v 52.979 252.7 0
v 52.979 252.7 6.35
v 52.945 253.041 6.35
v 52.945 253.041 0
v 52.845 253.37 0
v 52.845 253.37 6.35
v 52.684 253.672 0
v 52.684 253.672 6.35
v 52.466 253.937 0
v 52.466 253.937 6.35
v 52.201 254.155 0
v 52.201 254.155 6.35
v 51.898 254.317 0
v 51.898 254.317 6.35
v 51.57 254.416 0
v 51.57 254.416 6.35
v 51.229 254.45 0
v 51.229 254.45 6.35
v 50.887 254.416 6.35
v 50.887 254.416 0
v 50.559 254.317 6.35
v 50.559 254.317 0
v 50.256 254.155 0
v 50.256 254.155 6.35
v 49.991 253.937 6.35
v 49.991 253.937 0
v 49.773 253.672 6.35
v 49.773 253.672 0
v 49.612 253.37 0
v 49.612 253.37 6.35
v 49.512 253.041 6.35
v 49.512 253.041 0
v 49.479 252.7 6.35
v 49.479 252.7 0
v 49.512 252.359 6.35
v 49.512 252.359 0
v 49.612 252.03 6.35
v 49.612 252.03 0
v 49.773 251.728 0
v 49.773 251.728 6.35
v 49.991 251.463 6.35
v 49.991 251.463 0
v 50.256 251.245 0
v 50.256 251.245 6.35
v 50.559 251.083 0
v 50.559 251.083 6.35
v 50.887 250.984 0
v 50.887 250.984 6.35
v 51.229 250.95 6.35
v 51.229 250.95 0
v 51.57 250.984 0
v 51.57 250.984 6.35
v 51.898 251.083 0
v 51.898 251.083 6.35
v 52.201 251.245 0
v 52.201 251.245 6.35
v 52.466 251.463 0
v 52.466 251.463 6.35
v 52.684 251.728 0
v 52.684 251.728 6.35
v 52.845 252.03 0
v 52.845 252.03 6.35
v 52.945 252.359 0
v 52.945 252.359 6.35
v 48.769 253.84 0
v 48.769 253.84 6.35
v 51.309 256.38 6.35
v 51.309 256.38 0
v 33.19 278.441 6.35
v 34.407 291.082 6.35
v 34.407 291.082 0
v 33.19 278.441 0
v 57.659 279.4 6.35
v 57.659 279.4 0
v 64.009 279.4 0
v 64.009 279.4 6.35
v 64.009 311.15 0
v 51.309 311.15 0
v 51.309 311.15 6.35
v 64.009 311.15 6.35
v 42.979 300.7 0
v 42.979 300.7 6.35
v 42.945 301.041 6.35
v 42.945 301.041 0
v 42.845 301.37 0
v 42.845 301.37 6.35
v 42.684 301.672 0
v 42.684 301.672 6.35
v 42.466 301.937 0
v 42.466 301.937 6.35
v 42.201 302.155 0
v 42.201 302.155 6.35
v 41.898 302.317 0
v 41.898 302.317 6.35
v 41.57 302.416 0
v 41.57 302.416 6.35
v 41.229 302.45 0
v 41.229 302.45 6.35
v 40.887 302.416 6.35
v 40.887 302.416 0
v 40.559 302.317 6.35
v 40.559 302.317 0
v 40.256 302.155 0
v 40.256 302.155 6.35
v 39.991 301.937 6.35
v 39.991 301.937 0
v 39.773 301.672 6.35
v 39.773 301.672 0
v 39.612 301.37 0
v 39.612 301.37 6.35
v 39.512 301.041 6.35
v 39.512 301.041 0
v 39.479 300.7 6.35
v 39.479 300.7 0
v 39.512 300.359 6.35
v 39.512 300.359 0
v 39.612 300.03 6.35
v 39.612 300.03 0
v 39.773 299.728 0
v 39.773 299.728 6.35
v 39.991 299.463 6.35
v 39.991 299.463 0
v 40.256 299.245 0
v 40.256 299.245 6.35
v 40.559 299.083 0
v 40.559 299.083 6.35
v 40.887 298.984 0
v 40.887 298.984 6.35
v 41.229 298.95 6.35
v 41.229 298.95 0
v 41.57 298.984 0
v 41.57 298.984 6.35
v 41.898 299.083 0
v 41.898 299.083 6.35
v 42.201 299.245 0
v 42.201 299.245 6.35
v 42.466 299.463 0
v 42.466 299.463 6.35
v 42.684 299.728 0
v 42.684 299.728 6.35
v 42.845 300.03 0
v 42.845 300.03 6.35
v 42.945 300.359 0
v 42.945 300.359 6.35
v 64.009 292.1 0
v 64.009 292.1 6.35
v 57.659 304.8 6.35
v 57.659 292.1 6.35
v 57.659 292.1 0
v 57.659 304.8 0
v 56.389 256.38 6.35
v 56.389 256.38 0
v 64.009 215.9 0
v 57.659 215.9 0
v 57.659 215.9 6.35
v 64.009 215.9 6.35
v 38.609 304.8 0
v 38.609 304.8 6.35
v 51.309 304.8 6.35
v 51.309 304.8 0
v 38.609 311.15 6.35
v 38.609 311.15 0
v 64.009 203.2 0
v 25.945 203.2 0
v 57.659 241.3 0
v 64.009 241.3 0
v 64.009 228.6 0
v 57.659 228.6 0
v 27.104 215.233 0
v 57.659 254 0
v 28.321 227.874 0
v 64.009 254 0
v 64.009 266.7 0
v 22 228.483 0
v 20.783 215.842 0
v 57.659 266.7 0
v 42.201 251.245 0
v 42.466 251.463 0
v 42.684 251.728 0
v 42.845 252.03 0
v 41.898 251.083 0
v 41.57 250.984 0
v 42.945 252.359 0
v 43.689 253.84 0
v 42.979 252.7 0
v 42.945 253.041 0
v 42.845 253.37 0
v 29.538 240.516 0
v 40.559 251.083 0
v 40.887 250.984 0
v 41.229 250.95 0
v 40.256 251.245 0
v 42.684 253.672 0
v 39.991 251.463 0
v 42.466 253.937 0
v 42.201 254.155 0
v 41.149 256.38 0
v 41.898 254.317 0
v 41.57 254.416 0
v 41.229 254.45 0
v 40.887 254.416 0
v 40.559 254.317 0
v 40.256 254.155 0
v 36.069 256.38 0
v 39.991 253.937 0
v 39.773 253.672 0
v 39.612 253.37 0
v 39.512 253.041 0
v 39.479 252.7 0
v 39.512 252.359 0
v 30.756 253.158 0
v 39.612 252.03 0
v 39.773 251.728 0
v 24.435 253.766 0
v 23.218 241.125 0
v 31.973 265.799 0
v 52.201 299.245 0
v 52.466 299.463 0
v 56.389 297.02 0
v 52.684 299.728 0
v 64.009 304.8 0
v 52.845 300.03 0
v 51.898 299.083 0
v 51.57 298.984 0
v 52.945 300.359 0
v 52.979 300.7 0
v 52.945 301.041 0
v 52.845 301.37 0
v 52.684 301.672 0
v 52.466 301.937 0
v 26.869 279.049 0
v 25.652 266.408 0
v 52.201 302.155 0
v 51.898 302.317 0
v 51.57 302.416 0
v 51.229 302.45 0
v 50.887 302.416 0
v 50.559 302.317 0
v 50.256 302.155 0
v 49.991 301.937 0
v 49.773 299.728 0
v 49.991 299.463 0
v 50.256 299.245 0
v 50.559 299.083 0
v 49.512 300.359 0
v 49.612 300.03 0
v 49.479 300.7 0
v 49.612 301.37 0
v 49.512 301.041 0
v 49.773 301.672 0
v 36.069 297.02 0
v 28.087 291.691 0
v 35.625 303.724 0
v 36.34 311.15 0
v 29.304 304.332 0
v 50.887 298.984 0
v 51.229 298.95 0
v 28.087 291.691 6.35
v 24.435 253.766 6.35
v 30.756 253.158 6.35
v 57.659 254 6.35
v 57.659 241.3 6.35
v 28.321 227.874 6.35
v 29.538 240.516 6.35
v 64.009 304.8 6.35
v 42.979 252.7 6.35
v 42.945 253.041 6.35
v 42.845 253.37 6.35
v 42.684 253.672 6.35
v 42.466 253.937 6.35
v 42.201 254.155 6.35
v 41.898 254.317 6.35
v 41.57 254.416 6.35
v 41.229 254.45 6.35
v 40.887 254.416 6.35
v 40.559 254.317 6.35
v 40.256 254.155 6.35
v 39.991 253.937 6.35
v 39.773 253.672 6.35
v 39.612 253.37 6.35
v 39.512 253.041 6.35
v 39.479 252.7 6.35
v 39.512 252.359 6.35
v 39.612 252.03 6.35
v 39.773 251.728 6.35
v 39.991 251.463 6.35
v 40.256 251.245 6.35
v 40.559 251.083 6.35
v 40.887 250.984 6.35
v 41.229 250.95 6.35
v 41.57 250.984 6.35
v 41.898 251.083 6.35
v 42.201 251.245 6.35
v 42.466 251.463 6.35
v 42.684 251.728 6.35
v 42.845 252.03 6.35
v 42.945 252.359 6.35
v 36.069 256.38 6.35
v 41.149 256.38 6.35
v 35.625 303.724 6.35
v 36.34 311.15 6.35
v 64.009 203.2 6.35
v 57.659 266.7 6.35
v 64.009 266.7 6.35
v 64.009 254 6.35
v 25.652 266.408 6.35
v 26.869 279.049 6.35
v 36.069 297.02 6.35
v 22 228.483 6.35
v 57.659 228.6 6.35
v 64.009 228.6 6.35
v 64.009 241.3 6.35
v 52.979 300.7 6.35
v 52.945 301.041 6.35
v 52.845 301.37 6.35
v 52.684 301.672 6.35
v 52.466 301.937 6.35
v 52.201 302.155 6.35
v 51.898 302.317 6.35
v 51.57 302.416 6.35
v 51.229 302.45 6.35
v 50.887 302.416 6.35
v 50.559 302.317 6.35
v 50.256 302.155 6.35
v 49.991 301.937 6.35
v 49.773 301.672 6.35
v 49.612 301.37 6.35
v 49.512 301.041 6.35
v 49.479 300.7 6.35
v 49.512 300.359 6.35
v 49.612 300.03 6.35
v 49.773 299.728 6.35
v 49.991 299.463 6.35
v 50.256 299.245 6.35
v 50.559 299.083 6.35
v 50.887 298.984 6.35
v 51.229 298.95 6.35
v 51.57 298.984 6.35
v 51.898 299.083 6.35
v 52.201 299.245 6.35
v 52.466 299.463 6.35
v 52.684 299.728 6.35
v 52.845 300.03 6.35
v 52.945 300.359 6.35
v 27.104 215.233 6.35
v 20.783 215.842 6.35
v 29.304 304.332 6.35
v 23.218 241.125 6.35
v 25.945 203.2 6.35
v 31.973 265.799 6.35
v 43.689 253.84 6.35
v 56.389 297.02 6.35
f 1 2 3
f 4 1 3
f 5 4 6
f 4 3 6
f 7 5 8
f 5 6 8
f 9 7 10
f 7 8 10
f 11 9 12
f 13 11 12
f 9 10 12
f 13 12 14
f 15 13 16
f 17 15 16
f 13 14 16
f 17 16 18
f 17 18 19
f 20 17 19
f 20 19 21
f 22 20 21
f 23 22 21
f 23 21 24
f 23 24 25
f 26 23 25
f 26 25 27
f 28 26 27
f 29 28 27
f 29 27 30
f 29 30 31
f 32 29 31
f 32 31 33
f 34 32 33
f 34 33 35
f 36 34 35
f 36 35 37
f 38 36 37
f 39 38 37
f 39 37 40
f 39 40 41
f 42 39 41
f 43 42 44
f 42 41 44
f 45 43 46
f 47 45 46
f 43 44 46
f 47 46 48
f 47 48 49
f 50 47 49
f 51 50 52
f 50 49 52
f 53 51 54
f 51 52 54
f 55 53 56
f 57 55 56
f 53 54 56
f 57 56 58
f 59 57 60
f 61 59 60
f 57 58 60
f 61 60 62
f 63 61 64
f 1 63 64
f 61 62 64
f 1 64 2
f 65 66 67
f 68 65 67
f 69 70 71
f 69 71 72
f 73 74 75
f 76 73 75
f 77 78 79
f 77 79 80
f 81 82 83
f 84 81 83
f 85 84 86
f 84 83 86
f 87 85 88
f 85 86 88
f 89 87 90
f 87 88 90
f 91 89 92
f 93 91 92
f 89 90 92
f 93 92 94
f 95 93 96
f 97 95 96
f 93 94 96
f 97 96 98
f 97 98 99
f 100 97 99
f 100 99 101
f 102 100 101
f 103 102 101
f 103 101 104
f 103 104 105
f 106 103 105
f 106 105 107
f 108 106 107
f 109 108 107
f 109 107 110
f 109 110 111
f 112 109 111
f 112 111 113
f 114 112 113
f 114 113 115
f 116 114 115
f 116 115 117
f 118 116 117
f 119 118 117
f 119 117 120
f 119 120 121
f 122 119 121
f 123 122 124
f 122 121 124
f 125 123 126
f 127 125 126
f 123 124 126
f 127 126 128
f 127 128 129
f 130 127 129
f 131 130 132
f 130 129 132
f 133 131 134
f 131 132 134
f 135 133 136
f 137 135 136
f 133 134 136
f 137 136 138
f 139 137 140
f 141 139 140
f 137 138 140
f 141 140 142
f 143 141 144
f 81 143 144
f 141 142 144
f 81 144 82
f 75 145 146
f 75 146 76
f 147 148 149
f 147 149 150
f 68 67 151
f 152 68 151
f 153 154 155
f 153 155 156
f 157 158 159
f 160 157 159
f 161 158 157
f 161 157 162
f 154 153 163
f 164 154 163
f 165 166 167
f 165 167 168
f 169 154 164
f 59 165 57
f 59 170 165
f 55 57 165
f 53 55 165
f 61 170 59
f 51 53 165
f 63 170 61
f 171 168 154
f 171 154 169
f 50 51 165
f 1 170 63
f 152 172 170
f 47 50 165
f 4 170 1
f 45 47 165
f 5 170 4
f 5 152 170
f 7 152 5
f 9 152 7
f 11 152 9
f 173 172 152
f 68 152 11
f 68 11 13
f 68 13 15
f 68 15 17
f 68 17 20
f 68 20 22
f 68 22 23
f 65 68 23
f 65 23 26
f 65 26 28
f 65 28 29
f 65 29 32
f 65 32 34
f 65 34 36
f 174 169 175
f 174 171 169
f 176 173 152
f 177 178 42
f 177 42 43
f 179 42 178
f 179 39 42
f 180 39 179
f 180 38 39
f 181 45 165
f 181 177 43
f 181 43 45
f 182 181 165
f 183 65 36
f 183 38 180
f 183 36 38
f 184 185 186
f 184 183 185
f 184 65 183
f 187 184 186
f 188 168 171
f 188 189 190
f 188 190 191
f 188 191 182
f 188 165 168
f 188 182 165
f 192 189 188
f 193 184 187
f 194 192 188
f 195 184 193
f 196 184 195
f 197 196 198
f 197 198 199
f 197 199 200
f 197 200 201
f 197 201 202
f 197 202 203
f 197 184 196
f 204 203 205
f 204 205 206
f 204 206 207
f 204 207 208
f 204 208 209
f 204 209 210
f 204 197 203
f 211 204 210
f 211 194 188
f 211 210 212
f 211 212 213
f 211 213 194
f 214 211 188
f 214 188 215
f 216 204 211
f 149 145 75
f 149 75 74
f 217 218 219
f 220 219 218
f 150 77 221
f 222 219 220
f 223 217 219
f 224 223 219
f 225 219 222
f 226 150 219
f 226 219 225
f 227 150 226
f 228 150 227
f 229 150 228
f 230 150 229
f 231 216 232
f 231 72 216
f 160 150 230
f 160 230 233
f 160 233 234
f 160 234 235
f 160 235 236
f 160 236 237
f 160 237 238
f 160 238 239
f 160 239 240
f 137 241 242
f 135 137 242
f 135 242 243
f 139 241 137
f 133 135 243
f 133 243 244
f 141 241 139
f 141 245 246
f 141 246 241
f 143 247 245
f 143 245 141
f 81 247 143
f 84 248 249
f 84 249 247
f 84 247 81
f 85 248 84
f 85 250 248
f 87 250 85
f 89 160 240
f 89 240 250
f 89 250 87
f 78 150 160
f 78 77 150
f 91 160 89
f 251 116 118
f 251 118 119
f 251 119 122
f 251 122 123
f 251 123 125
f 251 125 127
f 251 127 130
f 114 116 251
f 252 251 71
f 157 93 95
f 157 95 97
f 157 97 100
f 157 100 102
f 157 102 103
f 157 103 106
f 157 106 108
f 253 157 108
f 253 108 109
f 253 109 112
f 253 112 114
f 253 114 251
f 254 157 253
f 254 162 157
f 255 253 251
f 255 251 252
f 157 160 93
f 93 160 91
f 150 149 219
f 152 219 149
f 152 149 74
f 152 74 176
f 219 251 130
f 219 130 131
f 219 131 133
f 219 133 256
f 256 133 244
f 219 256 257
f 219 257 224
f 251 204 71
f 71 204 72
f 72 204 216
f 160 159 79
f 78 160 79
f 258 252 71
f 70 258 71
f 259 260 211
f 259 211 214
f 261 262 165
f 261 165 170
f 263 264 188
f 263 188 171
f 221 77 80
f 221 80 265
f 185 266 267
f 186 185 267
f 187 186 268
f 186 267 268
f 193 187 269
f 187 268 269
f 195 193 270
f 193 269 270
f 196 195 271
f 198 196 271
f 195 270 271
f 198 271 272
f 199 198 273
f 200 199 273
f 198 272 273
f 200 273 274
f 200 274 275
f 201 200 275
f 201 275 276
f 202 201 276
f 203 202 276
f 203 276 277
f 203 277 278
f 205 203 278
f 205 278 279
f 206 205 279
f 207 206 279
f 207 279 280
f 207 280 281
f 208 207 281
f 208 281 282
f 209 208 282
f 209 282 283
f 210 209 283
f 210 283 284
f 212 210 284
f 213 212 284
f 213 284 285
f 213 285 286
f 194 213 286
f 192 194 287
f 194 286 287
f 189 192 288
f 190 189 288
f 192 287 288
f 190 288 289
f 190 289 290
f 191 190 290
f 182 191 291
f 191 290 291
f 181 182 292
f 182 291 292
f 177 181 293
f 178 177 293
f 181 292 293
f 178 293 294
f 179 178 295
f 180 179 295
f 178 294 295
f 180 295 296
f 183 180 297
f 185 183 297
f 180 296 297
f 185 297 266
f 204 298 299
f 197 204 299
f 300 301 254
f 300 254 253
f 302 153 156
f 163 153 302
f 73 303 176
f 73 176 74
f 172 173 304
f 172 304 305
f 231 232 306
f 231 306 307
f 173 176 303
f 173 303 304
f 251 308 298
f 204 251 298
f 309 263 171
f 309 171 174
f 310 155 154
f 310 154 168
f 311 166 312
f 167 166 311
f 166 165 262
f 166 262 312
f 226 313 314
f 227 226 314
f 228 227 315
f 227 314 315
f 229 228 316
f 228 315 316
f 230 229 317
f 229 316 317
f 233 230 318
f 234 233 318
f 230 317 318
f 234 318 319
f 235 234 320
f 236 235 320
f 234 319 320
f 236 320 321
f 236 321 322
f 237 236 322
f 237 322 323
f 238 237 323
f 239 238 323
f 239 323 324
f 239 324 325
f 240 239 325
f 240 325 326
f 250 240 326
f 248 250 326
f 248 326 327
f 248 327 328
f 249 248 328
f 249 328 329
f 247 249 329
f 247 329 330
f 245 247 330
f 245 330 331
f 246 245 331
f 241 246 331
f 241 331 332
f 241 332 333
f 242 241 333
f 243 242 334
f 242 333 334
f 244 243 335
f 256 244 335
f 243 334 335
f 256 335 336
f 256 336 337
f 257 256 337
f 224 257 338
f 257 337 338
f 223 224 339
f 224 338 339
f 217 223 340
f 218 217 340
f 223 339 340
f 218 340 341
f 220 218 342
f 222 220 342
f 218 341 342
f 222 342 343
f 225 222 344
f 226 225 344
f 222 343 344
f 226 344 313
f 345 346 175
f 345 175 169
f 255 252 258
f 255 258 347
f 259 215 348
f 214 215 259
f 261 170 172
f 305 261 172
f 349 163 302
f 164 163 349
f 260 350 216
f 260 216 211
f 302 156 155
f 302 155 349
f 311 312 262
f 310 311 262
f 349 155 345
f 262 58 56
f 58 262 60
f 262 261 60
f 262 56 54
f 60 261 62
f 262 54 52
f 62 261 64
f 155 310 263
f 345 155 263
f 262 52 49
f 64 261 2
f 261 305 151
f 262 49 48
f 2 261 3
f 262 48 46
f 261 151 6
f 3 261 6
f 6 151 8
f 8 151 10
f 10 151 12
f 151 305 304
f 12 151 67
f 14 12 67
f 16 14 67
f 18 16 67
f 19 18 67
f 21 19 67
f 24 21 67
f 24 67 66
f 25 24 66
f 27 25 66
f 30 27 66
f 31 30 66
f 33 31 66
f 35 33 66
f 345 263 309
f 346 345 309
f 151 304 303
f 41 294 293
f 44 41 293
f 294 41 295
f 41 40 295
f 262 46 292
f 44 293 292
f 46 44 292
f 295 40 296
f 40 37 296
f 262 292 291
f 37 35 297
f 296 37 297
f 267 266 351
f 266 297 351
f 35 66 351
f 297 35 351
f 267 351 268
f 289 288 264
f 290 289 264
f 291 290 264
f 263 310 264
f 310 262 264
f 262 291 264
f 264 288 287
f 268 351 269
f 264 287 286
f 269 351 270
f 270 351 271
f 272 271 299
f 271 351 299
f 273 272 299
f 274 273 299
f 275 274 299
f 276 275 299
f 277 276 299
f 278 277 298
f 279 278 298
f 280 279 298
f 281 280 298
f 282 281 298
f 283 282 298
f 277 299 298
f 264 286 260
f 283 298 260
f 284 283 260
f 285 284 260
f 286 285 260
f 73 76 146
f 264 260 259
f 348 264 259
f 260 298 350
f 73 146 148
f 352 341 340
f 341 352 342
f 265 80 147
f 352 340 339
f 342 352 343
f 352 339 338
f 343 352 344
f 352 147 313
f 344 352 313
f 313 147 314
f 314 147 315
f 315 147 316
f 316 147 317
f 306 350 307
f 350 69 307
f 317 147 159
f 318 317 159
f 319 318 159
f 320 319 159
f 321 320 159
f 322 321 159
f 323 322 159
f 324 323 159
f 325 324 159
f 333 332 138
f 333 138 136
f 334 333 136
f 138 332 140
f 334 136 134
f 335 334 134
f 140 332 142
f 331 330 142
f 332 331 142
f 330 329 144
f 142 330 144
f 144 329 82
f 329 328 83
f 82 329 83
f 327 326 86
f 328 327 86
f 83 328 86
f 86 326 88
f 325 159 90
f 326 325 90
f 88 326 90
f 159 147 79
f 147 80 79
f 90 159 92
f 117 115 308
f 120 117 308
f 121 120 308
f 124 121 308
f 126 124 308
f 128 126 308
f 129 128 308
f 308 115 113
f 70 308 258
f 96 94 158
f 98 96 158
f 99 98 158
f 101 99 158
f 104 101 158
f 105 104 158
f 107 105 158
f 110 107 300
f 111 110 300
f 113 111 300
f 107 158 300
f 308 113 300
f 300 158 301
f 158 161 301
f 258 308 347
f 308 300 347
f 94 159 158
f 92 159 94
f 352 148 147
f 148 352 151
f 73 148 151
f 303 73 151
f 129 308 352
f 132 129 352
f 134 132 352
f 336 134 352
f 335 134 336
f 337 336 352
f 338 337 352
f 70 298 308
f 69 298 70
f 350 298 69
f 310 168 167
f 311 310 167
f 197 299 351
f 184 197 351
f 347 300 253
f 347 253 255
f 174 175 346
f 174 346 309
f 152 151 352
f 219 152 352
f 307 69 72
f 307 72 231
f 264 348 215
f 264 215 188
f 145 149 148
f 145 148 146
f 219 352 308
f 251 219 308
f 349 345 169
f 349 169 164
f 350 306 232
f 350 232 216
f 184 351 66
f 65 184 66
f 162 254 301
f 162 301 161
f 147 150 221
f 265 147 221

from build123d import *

# Parameters (mm, degrees)
BOSS_EXTRUDE1_DEPTH = 6.35
SKETCH4_R           = 1.75
CUT_EXTRUDE1_DEPTH  = 7.35
SKETCH6_W           = 6.35
SKETCH6_H           = 12.7
CUT_EXTRUDE2_DEPTH  = 7.35
LPATTERN1_COUNT     = 5
LPATTERN1_PITCH     = 25.4
SKETCH7_W           = 12.7
SKETCH7_H           = 6.35
CUT_EXTRUDE3_DEPTH  = 7.35
CUT_EXTRUDE4_DEPTH  = 7.35
LPATTERN2_COUNT     = 5
LPATTERN2_PITCH     = 25.4


with BuildPart() as part:
    # Sketch2 → Boss-Extrude1 (new body)
    with BuildSketch(Plane.XY):
        Polygon((19.565934594, 203.2), (29.960337347, 311.15), (64.008541785, 311.15), (64.008541785, 203.2), align=None)
    extrude(amount=BOSS_EXTRUDE1_DEPTH)

    # Sketch4 → Cut-Extrude1 (cut, through all)
    with BuildSketch(Plane.XY.offset(6.35)):
        with Locations((41.228541785, 300.7)):
            Circle(SKETCH4_R)
        with Locations((51.228541785, 300.7)):
            Circle(SKETCH4_R)
        with Locations((41.228541785, 252.7)):
            Circle(SKETCH4_R)
        with Locations((51.228541785, 252.7)):
            Circle(SKETCH4_R)
        Polygon((56.388541785, 256.38), (56.388541785, 297.02), (36.068541785, 297.02), (36.068541785, 256.38), (41.148541785, 256.38), (43.688541785, 253.84), (48.768541785, 253.84), (51.308541785, 256.38), align=None)
    extrude(amount=-CUT_EXTRUDE1_DEPTH, mode=Mode.SUBTRACT)

    # Sketch6 → Cut-Extrude2 (cut, through all)
    with BuildSketch(Plane.XY.offset(6.35)):
        with Locations((60.833541785, 298.45)):
            Rectangle(SKETCH6_W, SKETCH6_H)
    cut_extrude2 = extrude(amount=-CUT_EXTRUDE2_DEPTH, mode=Mode.SUBTRACT)

    # LPattern1: Cut-Extrude2 ×5
    with Locations(*[(0, -i * LPATTERN1_PITCH, 0) for i in range(1, LPATTERN1_COUNT)]):
        add(cut_extrude2, mode=Mode.SUBTRACT)

    # Sketch7 → Cut-Extrude3 (cut, through all)
    with BuildSketch(Plane.XY.offset(6.35)):
        with Locations((44.958541785, 307.975)):
            Rectangle(SKETCH7_W, SKETCH7_H)
    extrude(amount=-CUT_EXTRUDE3_DEPTH, mode=Mode.SUBTRACT)

    # Sketch8 → Cut-Extrude4 (cut, through all)
    with BuildSketch(Plane.XY.offset(6.35)):
        Polygon((19.565934594, 203.2), (20.783175651, 215.841531719), (27.10394151, 215.232911191), (25.886700453, 202.591379471), align=None)
    cut_extrude4 = extrude(amount=-CUT_EXTRUDE4_DEPTH, mode=Mode.SUBTRACT)

    # LPattern2: Cut-Extrude4 ×5
    with Locations(*[Vector(0.095845753, 0.995396198, 0) * (i * LPATTERN2_PITCH) for i in range(1, LPATTERN2_COUNT)]):
        add(cut_extrude4, mode=Mode.SUBTRACT)


solid = part.part
